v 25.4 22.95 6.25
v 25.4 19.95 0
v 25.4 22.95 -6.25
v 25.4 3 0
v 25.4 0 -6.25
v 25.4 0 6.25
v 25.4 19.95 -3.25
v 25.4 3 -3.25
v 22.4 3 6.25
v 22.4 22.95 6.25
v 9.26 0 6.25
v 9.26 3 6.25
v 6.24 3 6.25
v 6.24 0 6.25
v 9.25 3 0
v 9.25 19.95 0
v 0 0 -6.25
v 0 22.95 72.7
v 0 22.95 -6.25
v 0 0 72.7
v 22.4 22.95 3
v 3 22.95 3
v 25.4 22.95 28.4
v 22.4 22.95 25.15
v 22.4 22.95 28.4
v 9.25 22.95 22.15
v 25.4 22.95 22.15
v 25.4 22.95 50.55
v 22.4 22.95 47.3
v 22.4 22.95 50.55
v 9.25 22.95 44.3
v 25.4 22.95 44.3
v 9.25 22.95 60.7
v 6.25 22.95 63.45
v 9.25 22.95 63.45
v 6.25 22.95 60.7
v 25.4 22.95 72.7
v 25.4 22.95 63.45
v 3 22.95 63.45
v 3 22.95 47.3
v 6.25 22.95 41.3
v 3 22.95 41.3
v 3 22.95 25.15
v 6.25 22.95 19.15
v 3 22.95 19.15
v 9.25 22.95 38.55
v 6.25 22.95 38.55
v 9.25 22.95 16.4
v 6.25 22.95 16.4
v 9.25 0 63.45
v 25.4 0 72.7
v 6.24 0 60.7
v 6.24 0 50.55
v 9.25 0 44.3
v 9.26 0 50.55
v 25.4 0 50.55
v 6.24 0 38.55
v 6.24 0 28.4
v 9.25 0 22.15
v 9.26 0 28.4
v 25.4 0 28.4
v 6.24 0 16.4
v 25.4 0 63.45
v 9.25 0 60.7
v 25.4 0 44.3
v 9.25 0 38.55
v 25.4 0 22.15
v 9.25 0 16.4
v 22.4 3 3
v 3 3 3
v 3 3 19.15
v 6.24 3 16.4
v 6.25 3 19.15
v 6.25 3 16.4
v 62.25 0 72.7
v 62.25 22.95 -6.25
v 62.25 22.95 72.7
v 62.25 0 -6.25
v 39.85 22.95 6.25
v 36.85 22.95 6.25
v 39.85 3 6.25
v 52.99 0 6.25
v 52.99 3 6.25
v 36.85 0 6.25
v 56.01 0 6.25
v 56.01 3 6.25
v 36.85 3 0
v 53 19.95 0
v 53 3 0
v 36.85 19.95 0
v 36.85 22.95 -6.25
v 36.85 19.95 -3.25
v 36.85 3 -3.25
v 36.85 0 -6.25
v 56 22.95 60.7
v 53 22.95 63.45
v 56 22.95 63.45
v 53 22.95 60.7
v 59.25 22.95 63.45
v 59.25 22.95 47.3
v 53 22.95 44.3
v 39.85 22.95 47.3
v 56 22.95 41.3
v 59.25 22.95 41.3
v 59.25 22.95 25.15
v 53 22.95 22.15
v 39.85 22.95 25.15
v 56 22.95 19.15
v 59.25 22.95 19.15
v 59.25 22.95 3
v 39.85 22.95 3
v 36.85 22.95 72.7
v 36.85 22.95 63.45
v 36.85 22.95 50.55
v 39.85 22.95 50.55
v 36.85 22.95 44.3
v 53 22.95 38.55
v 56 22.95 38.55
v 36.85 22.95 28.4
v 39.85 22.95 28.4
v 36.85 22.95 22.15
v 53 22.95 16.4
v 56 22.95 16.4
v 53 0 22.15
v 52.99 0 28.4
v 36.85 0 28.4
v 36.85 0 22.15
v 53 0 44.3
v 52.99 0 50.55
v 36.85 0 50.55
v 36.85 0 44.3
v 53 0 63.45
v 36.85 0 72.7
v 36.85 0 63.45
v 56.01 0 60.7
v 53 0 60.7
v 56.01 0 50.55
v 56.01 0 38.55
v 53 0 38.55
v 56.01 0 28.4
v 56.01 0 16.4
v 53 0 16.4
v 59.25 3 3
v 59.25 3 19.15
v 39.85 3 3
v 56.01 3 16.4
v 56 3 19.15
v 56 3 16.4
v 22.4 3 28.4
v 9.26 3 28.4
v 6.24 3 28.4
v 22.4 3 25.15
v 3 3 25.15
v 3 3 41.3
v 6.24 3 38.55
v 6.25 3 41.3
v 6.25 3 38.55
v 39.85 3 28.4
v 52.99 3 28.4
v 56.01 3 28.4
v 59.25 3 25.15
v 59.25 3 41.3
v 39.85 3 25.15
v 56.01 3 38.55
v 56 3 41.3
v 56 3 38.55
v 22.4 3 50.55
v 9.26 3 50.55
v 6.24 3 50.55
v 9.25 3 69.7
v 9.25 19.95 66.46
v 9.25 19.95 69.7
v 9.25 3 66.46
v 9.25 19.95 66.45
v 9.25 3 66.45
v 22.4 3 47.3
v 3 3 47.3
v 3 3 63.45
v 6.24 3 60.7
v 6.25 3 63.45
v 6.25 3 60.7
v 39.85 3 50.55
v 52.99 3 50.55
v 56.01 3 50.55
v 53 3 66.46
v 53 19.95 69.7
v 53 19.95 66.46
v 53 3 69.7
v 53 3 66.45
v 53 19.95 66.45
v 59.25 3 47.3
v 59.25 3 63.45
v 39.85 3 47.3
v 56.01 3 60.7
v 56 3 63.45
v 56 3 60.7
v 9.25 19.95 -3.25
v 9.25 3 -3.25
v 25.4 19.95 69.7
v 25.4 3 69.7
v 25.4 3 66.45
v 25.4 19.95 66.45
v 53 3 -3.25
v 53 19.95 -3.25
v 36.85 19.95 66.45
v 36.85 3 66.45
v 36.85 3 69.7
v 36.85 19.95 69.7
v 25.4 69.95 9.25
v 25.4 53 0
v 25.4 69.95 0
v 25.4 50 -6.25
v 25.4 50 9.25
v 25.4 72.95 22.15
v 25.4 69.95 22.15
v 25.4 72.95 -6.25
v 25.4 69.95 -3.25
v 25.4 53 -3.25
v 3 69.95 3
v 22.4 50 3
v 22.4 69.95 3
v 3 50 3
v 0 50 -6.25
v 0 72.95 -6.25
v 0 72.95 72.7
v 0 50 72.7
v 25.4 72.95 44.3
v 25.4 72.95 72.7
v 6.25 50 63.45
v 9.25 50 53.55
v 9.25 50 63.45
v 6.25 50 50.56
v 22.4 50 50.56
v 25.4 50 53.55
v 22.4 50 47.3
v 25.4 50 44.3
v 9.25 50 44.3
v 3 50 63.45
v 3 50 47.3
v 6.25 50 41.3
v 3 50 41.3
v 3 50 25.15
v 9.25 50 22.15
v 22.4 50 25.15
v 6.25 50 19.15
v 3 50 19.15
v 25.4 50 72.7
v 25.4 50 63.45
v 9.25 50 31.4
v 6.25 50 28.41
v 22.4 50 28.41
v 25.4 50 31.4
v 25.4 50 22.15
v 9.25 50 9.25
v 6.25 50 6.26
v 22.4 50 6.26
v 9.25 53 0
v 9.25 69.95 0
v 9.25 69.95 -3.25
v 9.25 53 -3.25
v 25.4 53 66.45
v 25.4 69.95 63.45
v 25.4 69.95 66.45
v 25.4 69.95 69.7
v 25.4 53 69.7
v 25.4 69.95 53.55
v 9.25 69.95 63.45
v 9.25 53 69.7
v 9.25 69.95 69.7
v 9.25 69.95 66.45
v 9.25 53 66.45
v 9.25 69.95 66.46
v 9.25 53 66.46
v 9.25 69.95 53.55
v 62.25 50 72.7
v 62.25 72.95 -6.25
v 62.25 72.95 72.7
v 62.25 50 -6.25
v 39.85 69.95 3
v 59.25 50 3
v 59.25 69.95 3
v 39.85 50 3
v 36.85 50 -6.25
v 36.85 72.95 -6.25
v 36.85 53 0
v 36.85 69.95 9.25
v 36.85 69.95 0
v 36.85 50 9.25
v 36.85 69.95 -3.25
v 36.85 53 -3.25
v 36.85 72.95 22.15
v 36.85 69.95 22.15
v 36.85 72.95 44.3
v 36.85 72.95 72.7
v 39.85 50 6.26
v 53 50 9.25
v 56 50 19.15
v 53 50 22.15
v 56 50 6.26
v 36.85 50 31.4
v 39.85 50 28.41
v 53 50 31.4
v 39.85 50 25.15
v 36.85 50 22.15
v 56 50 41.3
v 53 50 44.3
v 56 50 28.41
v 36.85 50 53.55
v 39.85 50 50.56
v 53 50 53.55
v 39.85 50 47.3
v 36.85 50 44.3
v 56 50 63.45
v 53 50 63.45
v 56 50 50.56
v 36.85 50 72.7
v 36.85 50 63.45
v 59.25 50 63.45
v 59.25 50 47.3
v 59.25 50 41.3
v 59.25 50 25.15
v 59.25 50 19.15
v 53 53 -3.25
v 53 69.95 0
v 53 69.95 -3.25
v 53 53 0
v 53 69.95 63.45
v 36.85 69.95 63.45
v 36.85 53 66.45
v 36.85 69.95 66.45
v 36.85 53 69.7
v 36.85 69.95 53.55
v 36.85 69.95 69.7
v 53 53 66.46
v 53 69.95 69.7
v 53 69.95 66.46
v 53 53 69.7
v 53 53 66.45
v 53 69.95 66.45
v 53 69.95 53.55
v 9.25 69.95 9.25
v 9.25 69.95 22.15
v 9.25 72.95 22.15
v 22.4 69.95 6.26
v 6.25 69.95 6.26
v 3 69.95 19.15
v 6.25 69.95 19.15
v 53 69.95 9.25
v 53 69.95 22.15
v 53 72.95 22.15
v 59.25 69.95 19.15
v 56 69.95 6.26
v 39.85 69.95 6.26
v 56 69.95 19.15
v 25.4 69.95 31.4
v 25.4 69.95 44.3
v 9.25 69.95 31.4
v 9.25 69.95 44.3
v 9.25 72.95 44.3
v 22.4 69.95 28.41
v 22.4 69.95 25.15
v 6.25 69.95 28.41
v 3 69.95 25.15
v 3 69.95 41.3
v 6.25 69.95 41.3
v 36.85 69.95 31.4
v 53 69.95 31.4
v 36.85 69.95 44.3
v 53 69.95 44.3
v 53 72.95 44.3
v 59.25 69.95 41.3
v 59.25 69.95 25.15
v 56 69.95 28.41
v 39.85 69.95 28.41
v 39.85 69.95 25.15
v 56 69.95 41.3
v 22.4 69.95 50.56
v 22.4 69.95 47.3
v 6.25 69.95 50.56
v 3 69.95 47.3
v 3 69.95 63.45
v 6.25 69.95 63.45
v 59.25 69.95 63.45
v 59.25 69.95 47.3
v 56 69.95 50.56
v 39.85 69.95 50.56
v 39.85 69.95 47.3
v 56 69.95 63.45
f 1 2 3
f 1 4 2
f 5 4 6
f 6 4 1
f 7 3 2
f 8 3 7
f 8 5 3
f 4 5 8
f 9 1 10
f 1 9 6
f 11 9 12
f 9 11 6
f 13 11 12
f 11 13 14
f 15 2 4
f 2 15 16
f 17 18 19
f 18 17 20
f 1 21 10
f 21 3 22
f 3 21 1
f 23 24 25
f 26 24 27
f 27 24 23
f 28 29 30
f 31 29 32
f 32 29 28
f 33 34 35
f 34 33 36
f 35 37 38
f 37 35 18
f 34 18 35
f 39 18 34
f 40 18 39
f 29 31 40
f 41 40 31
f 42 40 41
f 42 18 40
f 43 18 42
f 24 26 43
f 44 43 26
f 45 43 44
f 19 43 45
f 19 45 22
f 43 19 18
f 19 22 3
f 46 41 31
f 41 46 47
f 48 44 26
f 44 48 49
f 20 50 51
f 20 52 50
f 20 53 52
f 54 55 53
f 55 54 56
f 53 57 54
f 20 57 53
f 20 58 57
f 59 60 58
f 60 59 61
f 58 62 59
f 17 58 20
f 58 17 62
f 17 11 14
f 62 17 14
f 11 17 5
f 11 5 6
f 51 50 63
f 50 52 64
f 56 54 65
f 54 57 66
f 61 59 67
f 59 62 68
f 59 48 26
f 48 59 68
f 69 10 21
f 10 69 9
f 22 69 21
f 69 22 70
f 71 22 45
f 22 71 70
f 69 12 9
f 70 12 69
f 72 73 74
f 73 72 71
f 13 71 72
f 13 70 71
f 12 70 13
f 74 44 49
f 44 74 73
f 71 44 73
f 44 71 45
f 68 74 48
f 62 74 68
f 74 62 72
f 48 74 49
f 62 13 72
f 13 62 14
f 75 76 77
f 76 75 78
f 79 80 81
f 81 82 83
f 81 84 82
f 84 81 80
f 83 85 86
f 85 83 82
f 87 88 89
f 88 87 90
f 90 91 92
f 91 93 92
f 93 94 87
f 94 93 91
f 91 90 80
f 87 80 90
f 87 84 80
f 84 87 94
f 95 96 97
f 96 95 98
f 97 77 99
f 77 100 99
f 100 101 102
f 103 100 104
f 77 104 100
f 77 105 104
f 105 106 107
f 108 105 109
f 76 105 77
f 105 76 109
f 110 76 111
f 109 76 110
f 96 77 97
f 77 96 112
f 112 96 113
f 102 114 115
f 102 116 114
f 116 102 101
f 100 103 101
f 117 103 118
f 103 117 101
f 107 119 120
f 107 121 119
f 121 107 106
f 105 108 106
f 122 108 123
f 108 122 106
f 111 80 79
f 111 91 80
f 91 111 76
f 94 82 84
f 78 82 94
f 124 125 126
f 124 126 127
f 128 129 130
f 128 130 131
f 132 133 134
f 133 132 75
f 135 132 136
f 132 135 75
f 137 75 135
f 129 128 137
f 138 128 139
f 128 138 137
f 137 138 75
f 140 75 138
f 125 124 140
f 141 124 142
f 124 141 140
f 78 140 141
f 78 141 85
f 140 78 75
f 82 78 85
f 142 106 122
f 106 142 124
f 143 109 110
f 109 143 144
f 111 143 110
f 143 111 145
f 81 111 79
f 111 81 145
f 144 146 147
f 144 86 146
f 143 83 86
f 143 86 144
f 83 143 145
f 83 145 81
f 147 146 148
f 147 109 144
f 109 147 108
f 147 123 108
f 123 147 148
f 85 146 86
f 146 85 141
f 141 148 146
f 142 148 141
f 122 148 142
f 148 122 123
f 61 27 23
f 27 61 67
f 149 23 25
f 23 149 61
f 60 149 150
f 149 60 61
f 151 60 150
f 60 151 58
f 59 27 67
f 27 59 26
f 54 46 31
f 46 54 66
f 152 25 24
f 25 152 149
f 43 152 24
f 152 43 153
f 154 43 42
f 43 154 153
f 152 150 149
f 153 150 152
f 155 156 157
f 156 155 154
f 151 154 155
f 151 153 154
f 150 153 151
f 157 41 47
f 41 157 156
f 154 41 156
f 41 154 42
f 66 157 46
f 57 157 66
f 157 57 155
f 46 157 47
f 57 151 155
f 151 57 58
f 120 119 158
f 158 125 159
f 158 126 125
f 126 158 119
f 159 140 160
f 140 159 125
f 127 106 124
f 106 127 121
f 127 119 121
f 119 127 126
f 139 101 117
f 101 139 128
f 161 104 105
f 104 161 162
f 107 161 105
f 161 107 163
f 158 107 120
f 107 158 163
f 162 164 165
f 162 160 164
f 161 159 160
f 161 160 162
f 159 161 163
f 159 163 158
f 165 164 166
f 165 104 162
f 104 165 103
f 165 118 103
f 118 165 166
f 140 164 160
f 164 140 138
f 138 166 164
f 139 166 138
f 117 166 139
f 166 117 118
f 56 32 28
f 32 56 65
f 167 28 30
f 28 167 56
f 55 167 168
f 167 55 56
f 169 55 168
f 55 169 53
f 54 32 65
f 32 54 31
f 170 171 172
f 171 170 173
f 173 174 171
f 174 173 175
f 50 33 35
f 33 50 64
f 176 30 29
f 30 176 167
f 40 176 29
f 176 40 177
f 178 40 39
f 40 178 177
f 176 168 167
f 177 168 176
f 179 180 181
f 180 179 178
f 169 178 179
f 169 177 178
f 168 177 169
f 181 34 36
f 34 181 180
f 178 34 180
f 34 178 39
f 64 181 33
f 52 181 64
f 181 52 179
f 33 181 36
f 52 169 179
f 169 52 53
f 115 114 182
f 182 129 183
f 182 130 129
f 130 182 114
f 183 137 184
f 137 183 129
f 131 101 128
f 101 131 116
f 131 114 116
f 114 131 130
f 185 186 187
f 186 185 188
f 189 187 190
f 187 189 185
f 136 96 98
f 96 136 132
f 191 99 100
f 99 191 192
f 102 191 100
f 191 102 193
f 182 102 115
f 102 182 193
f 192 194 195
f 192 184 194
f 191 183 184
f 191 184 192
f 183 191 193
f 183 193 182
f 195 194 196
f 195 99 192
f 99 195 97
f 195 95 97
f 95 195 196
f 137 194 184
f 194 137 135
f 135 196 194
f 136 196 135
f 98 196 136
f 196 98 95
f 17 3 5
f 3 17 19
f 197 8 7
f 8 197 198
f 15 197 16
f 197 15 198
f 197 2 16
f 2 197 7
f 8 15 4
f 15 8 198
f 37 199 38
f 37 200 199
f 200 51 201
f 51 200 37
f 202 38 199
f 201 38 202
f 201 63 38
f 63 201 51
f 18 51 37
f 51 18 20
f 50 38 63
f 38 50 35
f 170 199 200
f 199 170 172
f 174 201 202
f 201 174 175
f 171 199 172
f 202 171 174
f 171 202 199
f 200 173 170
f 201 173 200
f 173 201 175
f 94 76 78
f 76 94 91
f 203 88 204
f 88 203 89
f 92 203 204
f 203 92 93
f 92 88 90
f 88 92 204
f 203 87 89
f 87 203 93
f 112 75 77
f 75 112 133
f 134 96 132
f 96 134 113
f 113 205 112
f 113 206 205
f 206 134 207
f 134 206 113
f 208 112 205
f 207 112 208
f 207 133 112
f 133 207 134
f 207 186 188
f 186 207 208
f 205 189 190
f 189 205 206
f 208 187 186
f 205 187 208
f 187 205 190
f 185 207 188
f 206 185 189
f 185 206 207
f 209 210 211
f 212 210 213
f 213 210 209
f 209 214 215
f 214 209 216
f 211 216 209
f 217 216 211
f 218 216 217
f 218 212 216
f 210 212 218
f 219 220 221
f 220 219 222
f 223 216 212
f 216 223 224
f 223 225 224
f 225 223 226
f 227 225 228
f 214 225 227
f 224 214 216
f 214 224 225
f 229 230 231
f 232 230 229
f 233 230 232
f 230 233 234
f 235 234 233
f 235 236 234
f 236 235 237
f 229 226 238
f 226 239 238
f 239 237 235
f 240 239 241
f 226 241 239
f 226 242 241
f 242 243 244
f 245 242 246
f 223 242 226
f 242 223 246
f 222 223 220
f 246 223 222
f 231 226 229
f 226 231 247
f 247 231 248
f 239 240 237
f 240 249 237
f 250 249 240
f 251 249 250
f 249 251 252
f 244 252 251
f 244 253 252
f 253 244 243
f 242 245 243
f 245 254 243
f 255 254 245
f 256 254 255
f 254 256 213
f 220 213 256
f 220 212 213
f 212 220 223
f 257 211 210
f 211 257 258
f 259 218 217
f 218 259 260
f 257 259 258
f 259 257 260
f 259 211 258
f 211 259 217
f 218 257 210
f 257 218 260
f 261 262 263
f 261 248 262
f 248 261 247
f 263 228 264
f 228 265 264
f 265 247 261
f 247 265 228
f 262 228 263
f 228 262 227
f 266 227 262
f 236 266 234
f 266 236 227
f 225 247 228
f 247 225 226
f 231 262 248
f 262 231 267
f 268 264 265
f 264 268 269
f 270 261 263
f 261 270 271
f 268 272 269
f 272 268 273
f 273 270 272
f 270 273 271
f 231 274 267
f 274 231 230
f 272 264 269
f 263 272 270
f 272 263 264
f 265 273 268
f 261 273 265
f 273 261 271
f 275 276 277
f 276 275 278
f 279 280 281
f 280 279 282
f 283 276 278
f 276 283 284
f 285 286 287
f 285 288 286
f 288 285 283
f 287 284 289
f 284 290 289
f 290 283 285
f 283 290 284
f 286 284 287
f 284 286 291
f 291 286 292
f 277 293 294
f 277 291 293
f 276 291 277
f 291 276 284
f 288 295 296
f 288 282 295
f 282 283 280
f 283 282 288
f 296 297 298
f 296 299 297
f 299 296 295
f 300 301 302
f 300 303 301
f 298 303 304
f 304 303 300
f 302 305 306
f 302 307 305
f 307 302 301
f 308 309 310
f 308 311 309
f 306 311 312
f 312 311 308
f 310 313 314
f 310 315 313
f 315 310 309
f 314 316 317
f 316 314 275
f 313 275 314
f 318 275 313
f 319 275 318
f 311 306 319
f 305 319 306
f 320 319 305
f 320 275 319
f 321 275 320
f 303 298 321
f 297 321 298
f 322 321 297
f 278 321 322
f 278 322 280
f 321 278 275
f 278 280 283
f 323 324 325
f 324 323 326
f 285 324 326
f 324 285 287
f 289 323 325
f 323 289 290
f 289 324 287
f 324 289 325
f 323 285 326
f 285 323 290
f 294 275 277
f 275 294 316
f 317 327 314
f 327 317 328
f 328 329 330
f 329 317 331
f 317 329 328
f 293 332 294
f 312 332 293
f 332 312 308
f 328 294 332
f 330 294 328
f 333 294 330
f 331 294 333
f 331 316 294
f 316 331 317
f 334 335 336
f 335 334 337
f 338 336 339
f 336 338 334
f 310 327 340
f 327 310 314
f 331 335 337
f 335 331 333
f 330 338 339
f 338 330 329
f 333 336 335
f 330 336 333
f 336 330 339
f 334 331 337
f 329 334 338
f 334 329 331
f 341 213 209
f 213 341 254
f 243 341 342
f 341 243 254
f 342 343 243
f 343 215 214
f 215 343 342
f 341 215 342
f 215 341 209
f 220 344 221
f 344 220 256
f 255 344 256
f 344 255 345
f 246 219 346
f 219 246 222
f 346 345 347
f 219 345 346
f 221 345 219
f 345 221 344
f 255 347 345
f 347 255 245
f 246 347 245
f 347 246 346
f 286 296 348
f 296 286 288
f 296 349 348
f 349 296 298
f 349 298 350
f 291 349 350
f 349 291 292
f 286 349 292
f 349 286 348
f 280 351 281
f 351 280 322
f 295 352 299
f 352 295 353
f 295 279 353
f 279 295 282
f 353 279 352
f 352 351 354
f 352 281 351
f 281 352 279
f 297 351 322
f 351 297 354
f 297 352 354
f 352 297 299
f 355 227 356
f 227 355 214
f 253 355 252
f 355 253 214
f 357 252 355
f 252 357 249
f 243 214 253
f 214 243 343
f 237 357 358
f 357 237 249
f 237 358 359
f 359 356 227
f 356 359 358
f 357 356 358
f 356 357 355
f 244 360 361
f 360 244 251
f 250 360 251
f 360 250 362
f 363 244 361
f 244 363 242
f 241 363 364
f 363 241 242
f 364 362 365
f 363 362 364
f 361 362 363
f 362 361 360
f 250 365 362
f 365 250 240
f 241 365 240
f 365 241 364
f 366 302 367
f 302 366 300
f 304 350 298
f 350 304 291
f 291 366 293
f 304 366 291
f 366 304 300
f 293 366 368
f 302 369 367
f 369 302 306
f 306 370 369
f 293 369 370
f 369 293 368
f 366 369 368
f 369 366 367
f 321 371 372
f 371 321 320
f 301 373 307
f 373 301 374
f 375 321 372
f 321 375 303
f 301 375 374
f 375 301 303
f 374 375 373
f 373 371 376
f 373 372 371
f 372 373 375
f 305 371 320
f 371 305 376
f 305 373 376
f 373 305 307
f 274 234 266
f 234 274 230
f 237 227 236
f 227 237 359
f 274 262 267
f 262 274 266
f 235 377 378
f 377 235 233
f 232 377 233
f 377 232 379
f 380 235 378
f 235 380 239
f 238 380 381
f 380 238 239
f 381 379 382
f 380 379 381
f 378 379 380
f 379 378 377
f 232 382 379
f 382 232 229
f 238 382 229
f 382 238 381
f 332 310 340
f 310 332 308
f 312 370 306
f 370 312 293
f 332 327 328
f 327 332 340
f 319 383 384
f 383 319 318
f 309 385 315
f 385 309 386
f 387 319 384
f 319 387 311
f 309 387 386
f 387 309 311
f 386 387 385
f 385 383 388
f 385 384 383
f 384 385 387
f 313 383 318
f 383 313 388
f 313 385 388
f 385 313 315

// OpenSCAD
eps = 0.01;
z_tol = 0.8;

// wood piece parameters
wp_x = 16.15;
wp_y = 3.25;

// holder parameters
// wall thickness
wt = 3;
// cut depth
cd = wt+wp_x+wt+z_tol;
// hook hight
hh = 3;
// border width
cd_s = wt+wp_x-wt;

// variable parameteres
// number of levels
nl = 3;

module end_holder(right=0)
{
    difference()
    {
        // main shape
        cube([wt+wp_x+wp_y+wt,cd,wt+wp_y+wt]);
        
        // cut for the wood piece
        translate(right==1 ? [-eps,wt,wt] : [wt+wt+wp_y,wt,wt])
            cube([cd_s+eps,wp_x+z_tol,wp_y]);
    }
}

module front_level(right=0)
{
    difference()
    {
        union()
        {
            // horizontal block
            cube([wt+wp_x+wp_y+wt, cd, wt+wp_y]);
            // vertical block
            translate(right==1 ? [wp_x,0,0] : [0,0,0])
                cube([wt+wp_y+wt, cd, wt+wp_x+wt+eps]);
        }
        
        // horizontal wooden piece cut
        translate([wt,wt,wt])
            cube([wp_x+wp_y,cd+eps,wp_y+eps]);
        
        // vertical wooden piece cut
        translate(right==1 ? [wt+wp_x,wt,wt] : [wt,wt,wt])
            cube([wp_y,cd+eps,wp_x]);
        
        // hook cut
        translate(  right==1 ?
                    [wp_x-eps,-eps,wt+wp_y] : 
                    [wt+wp_y-eps,-eps,wt+wp_y])
            cube([wt+2*eps,cd+2*eps,wp_x-hh-wt]);
    }
}

module front_piece()
{   
    
    _z = wt+wp_x+wt;
    
    // borders
    for(i=[0:nl-1])
    {
        translate([0,0,i*_z])
            front_level();
        translate([50-wp_x+wt,0,i*_z])
            front_level(right=1);
    }
    
    translate([0,0,-wt-wp_y])
        end_holder();
    
    translate([0,0,nl*_z-wt])
        end_holder();
    
    translate([50+wt-wp_x,0,-wt-wp_y])
        end_holder(right=1);
    
    translate([50+wt-wp_x,0,nl*_z-wt])
        end_holder(right=1);
    
}

front_piece();

module back_level(right=0)
{
    difference()
    {
        union()
        {
            // horizontal part
            cube([wt+wp_x+wp_y+wt, cd, wt+wp_y+wt]);
            
            // vertical part
            translate(right==1 ? [wp_x,0,0] : [0,0,0])
                cube([wt+wp_y+wt, cd, wt+wp_x+wt+eps]);
            // back pieces
            translate([0,cd-wt,0])
                cube([wt+wp_x+wp_y+wt, wt, wt+wp_x+wt]);
        }
        
        // horizontal wooden piece cut
        translate([wt,-eps,wt])
            cube([wp_x+wp_y,cd-wt+eps,wp_y+eps]);
        
        // vertical wooden piece cut
        translate(right== 1 ? [wt+wp_x,-eps,wt] : [wt,-eps,wt])
            cube([wp_y,cd-wt+eps,wp_x]);
    }
}

//translate([50,0,0])
//    back_level(right=1);

module back_piece()
{   
    
    _z = wt+wp_x+wt;
    
    // borders
    for(i=[0:nl-1])
    {
        translate([0,0,i*_z])
            back_level(right=0);
        translate([50-wp_x+wt,0,i*_z])
            back_level(right=1);
    }
    
    translate([0,0,-wt-wp_y])
        end_holder();
    
    translate([0,0,nl*_z-wt])
        end_holder();
    
    translate([50+wt-wp_x,0,-wt-wp_y])
        end_holder(right=1);
    
    translate([50+wt-wp_x,0,nl*_z-wt])
        end_holder(right=1);
    
}
translate([0,50,0])
    back_piece();
